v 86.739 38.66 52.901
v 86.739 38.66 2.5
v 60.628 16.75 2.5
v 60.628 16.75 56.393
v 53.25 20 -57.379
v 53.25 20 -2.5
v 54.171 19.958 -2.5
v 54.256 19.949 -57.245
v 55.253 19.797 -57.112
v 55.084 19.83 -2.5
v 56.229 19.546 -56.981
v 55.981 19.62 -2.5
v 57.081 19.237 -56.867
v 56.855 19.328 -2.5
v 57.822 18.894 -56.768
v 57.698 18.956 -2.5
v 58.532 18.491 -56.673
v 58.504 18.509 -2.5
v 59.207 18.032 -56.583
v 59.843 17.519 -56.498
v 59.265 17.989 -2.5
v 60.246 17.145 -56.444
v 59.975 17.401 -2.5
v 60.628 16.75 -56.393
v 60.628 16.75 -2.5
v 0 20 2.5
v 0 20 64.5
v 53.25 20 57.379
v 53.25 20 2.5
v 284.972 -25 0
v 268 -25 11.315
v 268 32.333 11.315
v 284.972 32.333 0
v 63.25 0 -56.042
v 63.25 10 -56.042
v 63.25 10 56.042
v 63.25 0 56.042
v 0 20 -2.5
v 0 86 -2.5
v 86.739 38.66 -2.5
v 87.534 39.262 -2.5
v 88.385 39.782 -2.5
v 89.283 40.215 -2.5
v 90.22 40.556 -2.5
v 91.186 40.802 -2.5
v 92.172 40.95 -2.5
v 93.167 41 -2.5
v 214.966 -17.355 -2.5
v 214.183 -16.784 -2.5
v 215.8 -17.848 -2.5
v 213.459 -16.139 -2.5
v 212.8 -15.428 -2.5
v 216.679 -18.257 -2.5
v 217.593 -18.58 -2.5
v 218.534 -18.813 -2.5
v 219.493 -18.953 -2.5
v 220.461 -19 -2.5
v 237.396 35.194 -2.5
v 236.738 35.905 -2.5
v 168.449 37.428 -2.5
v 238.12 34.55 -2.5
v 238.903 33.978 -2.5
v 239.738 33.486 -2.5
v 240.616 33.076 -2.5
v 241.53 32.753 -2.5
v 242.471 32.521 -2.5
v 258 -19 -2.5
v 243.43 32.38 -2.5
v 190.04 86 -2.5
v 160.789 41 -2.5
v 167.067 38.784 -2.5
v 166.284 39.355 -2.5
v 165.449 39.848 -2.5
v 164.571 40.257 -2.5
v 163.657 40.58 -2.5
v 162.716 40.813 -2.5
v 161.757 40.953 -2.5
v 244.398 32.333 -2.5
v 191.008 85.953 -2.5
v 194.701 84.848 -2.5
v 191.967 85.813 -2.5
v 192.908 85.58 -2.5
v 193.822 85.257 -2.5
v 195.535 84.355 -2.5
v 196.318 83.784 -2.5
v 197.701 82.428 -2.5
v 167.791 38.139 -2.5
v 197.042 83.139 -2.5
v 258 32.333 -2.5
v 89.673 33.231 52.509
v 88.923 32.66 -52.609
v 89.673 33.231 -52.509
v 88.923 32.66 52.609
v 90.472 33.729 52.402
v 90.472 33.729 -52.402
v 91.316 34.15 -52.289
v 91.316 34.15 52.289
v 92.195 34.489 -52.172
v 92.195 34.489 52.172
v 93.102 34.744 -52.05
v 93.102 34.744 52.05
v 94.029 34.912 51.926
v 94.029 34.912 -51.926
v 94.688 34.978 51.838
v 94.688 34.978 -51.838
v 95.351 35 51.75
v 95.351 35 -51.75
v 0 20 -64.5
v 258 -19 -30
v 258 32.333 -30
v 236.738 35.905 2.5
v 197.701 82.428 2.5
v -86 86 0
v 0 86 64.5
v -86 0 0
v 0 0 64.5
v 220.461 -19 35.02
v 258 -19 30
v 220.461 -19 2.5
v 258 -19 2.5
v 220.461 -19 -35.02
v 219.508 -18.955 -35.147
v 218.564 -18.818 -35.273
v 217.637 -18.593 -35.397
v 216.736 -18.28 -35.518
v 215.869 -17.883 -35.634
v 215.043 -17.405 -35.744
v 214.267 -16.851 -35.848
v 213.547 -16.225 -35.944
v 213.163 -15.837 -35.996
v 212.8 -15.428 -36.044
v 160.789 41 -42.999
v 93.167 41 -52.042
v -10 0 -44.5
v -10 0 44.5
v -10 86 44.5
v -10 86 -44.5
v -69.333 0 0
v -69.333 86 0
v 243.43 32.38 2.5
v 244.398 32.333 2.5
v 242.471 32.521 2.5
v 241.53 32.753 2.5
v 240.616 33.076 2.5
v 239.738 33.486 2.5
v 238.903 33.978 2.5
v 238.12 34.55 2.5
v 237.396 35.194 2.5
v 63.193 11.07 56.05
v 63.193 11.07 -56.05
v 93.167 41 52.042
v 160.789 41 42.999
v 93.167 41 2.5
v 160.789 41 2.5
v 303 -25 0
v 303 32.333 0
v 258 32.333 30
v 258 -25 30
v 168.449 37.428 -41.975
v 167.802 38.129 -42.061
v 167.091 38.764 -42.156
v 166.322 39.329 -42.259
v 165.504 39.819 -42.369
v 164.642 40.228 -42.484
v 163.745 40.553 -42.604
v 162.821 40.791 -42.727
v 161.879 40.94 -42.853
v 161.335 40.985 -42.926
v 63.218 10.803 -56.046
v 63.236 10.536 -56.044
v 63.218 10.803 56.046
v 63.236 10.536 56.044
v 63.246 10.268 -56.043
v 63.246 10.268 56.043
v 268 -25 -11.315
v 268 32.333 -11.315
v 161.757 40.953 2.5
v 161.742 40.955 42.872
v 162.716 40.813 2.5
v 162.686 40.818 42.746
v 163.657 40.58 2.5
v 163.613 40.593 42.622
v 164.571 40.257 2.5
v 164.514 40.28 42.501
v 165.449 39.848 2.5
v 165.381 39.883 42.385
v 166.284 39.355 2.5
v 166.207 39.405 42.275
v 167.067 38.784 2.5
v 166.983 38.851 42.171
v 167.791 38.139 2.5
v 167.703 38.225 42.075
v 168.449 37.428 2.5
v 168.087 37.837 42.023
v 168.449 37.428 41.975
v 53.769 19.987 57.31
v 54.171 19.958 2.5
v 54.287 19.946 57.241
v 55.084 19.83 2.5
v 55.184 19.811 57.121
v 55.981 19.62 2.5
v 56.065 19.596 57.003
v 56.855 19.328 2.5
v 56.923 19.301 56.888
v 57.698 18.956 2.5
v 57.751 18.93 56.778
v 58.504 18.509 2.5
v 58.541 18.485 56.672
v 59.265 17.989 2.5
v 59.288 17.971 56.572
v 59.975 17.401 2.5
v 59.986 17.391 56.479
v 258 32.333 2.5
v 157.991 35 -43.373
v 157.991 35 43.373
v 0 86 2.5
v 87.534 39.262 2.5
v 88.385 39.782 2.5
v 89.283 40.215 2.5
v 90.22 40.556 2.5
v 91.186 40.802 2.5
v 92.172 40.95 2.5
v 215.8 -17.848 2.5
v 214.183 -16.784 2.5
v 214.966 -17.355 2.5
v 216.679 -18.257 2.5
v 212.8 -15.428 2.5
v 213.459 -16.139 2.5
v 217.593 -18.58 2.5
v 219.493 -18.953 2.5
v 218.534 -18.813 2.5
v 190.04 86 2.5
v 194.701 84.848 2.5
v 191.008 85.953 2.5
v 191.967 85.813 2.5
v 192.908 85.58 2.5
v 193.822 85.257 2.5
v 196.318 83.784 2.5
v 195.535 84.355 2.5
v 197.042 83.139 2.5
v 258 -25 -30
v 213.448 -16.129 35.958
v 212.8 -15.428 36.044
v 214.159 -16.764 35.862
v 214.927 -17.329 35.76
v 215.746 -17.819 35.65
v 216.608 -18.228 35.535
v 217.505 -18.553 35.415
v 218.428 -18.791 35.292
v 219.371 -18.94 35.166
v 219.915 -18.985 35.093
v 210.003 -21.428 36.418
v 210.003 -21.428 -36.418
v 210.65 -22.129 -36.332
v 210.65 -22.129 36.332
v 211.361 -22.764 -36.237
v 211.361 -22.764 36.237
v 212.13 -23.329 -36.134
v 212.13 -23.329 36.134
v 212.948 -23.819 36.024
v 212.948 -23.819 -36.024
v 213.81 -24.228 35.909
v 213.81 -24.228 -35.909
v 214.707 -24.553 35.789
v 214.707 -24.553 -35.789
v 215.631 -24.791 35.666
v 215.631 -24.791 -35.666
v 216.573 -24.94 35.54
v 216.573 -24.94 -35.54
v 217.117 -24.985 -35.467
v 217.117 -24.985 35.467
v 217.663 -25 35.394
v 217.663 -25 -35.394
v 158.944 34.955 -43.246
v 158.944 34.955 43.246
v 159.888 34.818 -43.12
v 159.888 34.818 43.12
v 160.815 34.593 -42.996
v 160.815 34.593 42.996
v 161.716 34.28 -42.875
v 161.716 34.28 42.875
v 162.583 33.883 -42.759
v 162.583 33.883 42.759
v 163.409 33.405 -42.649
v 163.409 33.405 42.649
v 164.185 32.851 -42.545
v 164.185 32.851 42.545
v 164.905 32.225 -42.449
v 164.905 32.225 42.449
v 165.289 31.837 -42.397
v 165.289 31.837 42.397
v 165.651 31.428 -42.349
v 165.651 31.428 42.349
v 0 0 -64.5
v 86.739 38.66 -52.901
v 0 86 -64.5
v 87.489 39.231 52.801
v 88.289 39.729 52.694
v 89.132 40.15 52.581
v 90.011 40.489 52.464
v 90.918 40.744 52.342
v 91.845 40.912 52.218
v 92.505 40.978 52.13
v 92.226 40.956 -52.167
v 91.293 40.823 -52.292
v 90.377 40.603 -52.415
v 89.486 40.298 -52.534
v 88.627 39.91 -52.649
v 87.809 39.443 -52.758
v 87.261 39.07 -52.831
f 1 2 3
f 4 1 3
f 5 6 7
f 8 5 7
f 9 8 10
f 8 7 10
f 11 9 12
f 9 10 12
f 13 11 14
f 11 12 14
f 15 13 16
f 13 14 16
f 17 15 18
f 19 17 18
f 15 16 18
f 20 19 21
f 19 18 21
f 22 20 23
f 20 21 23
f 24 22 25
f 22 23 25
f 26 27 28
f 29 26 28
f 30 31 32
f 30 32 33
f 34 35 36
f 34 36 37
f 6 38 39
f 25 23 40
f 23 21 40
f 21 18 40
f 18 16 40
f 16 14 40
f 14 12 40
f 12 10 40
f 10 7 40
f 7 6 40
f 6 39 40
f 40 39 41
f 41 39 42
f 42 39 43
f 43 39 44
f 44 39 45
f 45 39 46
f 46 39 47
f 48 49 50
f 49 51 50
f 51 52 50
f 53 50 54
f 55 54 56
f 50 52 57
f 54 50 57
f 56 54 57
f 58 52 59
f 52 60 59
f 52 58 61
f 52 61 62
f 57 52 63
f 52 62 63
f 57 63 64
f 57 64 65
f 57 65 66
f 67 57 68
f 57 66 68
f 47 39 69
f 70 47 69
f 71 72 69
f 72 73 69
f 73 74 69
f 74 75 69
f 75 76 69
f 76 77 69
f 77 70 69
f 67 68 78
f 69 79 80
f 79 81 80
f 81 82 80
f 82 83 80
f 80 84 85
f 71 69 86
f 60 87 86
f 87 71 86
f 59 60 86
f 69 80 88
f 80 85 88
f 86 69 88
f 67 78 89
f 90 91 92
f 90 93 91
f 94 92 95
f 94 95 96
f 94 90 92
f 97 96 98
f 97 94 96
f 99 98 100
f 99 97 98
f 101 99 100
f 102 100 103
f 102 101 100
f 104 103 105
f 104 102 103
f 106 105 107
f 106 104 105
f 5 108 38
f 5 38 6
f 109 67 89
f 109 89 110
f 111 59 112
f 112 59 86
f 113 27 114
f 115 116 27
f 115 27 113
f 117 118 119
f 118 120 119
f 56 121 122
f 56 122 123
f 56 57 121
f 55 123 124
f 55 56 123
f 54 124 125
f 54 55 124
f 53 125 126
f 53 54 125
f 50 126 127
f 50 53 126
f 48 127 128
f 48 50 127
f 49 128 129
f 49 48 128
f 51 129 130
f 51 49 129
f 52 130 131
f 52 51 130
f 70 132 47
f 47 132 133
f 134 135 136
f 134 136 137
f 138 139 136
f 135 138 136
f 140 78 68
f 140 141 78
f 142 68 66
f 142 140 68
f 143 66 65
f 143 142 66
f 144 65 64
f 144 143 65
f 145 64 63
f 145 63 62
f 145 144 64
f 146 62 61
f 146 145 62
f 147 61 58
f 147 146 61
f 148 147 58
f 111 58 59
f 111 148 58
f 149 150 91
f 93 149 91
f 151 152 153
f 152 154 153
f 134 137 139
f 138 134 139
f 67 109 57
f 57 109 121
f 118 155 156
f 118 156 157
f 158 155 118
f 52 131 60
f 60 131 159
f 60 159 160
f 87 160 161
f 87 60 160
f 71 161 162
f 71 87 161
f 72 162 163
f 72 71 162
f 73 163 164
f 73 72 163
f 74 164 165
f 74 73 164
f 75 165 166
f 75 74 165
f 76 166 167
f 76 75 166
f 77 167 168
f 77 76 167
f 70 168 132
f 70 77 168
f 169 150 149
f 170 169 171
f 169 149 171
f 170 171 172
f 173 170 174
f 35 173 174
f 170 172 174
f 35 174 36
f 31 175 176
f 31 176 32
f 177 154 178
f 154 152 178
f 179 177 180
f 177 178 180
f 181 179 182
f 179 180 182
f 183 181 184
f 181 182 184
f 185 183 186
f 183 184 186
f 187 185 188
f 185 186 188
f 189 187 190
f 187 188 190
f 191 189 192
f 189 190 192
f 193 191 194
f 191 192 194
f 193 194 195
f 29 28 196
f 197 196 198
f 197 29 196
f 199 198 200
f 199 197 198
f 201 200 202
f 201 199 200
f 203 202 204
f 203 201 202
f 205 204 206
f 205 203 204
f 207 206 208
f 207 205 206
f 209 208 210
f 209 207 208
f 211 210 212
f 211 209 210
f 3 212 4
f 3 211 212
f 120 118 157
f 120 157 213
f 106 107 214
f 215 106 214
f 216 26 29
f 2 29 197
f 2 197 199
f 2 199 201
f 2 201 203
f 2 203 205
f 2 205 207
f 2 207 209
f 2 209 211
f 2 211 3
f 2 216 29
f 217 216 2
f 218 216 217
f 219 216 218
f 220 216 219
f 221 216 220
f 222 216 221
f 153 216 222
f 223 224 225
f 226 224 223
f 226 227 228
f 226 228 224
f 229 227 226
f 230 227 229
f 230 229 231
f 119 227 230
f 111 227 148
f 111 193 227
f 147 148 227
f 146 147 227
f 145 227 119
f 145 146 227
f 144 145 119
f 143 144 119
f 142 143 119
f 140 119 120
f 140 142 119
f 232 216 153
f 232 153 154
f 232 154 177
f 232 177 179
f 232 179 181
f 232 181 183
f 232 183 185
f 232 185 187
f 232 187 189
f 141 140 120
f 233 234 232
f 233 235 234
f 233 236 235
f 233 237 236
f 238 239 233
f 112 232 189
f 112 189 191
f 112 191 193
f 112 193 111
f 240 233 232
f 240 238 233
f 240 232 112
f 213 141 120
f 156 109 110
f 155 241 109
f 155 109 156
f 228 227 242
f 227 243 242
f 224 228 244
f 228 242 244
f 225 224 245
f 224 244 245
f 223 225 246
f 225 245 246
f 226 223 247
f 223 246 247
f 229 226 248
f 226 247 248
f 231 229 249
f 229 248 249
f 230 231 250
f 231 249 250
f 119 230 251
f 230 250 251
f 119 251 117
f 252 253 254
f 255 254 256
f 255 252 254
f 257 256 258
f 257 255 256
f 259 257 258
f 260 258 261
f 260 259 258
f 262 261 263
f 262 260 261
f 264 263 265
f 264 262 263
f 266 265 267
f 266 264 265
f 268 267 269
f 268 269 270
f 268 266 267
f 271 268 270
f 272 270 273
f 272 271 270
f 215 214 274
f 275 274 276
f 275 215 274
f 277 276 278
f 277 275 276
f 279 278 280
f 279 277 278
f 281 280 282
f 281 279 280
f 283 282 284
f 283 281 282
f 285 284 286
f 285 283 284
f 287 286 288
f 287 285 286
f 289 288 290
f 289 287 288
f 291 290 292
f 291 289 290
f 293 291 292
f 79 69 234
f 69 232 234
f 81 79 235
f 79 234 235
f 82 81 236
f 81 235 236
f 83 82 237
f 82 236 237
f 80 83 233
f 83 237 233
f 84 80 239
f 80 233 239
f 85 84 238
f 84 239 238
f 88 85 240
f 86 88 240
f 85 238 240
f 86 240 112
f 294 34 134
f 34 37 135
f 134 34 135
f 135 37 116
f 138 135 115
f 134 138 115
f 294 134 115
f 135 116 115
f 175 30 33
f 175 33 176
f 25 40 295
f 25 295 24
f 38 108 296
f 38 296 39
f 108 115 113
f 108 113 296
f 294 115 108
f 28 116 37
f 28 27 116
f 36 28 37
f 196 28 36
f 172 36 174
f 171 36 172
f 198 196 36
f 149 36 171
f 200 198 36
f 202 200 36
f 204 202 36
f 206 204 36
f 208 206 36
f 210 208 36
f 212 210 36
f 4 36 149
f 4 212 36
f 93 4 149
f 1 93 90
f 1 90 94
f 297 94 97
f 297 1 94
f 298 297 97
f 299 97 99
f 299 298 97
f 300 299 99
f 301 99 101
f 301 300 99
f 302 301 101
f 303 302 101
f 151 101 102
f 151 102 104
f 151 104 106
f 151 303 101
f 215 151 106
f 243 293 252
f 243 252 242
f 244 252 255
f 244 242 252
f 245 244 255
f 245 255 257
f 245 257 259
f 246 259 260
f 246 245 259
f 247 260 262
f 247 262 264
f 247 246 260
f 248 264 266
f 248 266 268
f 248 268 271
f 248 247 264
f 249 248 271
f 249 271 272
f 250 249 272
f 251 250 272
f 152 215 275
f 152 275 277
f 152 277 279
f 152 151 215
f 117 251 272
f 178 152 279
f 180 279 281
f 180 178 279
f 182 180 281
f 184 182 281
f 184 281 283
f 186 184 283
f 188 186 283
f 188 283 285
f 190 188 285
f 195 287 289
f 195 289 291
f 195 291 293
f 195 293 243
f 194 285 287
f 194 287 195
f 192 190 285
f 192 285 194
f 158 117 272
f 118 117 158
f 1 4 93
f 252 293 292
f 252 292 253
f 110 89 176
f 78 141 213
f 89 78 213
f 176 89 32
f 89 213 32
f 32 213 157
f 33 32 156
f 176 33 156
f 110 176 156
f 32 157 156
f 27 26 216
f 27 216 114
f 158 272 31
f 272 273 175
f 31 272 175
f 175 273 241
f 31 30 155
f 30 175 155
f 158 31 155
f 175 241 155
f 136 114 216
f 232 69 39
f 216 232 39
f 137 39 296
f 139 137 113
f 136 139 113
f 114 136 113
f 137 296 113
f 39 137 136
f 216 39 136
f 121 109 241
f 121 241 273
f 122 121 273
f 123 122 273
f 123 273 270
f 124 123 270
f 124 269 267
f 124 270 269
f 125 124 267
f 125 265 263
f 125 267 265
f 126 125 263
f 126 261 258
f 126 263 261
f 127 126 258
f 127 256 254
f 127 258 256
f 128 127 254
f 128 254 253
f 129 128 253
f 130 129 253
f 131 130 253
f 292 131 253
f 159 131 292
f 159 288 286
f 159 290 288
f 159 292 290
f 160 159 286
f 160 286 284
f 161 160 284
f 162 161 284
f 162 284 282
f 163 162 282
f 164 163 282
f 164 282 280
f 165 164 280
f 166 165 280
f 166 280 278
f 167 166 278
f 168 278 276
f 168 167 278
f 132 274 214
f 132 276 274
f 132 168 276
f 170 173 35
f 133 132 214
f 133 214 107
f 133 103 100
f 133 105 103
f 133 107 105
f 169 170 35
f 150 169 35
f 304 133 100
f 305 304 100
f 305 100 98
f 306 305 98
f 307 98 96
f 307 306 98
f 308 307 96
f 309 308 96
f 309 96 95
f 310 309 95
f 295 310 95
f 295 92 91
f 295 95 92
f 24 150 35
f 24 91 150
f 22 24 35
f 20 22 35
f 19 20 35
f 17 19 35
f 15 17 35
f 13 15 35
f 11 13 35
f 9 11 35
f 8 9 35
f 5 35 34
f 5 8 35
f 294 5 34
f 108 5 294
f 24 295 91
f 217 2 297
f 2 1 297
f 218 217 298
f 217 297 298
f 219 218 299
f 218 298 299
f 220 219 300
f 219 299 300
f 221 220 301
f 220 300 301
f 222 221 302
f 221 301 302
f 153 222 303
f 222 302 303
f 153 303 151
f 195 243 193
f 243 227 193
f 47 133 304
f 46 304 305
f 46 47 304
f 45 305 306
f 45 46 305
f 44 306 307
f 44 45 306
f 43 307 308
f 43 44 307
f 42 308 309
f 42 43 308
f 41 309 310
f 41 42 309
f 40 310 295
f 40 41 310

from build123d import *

# Parameters (mm, degrees)
EXTRUDE_1_DEPTH             = 86
EXTRUDE_1_2_DEPTH           = 64.5
EXTRUDE_1_2_DEPTH_BACK      = 64.5
EXTRUDE_5_DEPTH             = 57.333333333
CUT_EXTRUDE_5_DEPTH         = 328.099755426
CUT_EXTRUDE_5_DEPTH_BACK    = 328.099755426
SKETCH_13_OUTSIDE_W         = 475.92
SKETCH_13_OUTSIDE_H         = 215.92
RIB_START                   = -2.5
RIB_2_DEPTH                 = 5
FILLET_1_R                  = 10
CUT_EXTRUDE_3_DEPTH         = 322.504665596
CUT_EXTRUDE_3_DEPTH_BACK    = 322.504665596
SKETCH_10_R                 = 5
CUT_EXTRUDE_4_DEPTH         = 322.504665596
CUT_EXTRUDE_4_DEPTH_BACK    = 322.504665596
SKETCH_11_R                 = 5
EXTRUDE_6_REACH             = 323.505
EXTRUDE_6_DIRECTION_2_REACH = 323.505


# Read off the part's stored shape, not the designer's step: 보강대2
with BuildPart() as part:
    # 스케치1 → Extrude 1 (new body)
    with BuildSketch(Plane(origin=(0, 0, 0), x_dir=(1, 0, 0), z_dir=(0, 1, 0))):
        Polygon((0, 64.5), (0, -64.5), (-86, 0), align=None)
        Polygon((-10, 44.5), (-69.333333333, 0), (-10, -44.5), align=None, mode=Mode.SUBTRACT)
    extrude(amount=EXTRUDE_1_DEPTH)


with BuildPart() as body_2:
    # 스케치3 → Extrude 1 2 (new, two sides: drawn at the far end of the back side and taken through both)
    with BuildSketch(Plane.XY.offset(-EXTRUDE_1_2_DEPTH_BACK)):
        Polygon((0, 0), (50, 0), (91.711375741, 35), (162.654022129, 35), (213, -25), (258, -25), (258, -19), (215.797845949, -19), (165.451868078, 41), (89.527554335, 41), (47.816178594, 6), (0, 6), align=None)
    extrude(amount=EXTRUDE_1_2_DEPTH + EXTRUDE_1_2_DEPTH_BACK)

    # 스케치13 outside → 컷-돌출5 (cut, two sides: drawn at the far end of the back side and taken through both)
    with BuildSketch(Plane(origin=(0, -19, 0), x_dir=(1, 0, 0), z_dir=(0, 1, 0)).offset(-CUT_EXTRUDE_5_DEPTH_BACK)):
        with Locations((108.5, 0)):
            Rectangle(SKETCH_13_OUTSIDE_W, SKETCH_13_OUTSIDE_H)
        Polygon((0, 64.5), (258, 30), (258, -30), (0, -64.5), align=None, mode=Mode.SUBTRACT)
    extrude(amount=CUT_EXTRUDE_5_DEPTH + CUT_EXTRUDE_5_DEPTH_BACK, mode=Mode.SUBTRACT)


with BuildPart() as body_3:
    # 스케치12 → 보스-돌출5 (new body)
    with BuildSketch(Plane.XZ.offset(25)):
        Polygon((258, 30), (258, -30), (303, 0), align=None)
        Polygon((268, 11.314829082), (284.972243623, 0), (268, -11.314829082), align=None, mode=Mode.SUBTRACT)
    extrude(amount=-EXTRUDE_5_DEPTH)


with BuildPart() as part_1:
    add(part.part)

    # Combine 1: union body 3, body 2
    add(body_3.part)
    add(body_2.part)

    # 보강대2 outline → 보강대2 (add)
    with BuildSketch(Plane.XY.offset(RIB_START)):
        Polygon((239.734972401, 32.333333333), (194.703292194, 86), (0, 86), (0, 6), (47.816178594, 6), (89.527554335, 41), (165.451868078, 41), (215.797845949, -19), (258, -19), (258, 32.333333333), align=None)
    extrude(amount=RIB_2_DEPTH)

    # 필렛1
    fillet_1_edges = [part_1.edges().sort_by_distance(p)[0] for p in [
        (194.703292194, 86, 0),
        (213, -25, 0),
        (215.797845949, -19, 19.071655649),
        (165.451868078, 41, 22.437811146),
        (89.527554335, 41, 27.514146076),
        (47.816178594, 6, 30.302988059),
        (50, 0, 0),
        (91.711375741, 35, 0),
        (162.654022129, 35, 0),
        (47.816178594, 6, -30.302988059),
        (89.527554335, 41, -27.514146076),
        (165.451868078, 41, -22.437811146),
        (215.797845949, -19, -19.071655649),
        (239.734972401, 32.333333333, 0),
    ]]
    fillet(fillet_1_edges, radius=FILLET_1_R)

    # 스케치10 → 컷-돌출3 (cut, two sides: drawn at the far end of the back side and taken through both)
    with BuildSketch(Plane.XY.offset(-CUT_EXTRUDE_3_DEPTH_BACK)):
        with Locations((158, -20)):
            Circle(SKETCH_10_R)
    extrude(amount=CUT_EXTRUDE_3_DEPTH + CUT_EXTRUDE_3_DEPTH_BACK, mode=Mode.SUBTRACT)

    # 스케치11 → 컷-돌출4 (cut, two sides: drawn at the far end of the back side and taken through both)
    with BuildSketch(Plane.XY.offset(-CUT_EXTRUDE_4_DEPTH_BACK)):
        with Locations(Location((53.25, 10, 0), (0, 0, 44.917604926))):
            Circle(SKETCH_11_R)
    extrude(amount=CUT_EXTRUDE_4_DEPTH + CUT_EXTRUDE_4_DEPTH_BACK, mode=Mode.SUBTRACT)

    # 보스-돌출6: up to this plane
    extrude_6_end = Plane(origin=(258, -25, 30), z_dir=(0.13254117731278448, 0, 0.9911774999043013))
    # 스케치8 → 보스-돌출6 (add, up to the surface)
    with BuildSketch(Plane.XY, mode=Mode.PRIVATE) as extrude_6_sk1:
        with BuildLine():
            Line((63.25, 0), (0, 0))
            Line((0, 0), (0, 20))
            Line((0, 20), (53.25, 20))
            ThreePointArc((53.25, 20), (60.321067812, 17.071067812), (63.25, 10))
            Line((63.25, 10), (63.25, 0))
        make_face()
    extrude_6_tool1 = split(extrude(extrude_6_sk1.sketch, amount=EXTRUDE_6_REACH, mode=Mode.PRIVATE), bisect_by=extrude_6_end, keep=Keep.BOTH, mode=Mode.PRIVATE)
    add(extrude_6_tool1.solids().sort_by_distance((31.117784, 9.865974, 0))[0])

    # 보스-돌출6 direction 2: up to this plane
    extrude_6_direction_2_end = Plane(origin=(0, -25, -64.5), z_dir=(0.13254117731278448, 0, -0.9911774999043013))
    # 스케치8 → 보스-돌출6 direction 2 (add, up to the surface)
    with BuildSketch(Plane.XY, mode=Mode.PRIVATE) as extrude_6_direction_2_sk1:
        with BuildLine():
            Line((63.25, 0), (0, 0))
            Line((0, 0), (0, 20))
            Line((0, 20), (53.25, 20))
            ThreePointArc((53.25, 20), (60.321067812, 17.071067812), (63.25, 10))
            Line((63.25, 10), (63.25, 0))
        make_face()
    extrude_6_direction_2_tool1 = split(extrude(extrude_6_direction_2_sk1.sketch, amount=-EXTRUDE_6_DIRECTION_2_REACH, mode=Mode.PRIVATE), bisect_by=extrude_6_direction_2_end, keep=Keep.BOTH, mode=Mode.PRIVATE)
    add(extrude_6_direction_2_tool1.solids().sort_by_distance((31.117784, 9.865974, 0))[0])


solid = part_1.part
